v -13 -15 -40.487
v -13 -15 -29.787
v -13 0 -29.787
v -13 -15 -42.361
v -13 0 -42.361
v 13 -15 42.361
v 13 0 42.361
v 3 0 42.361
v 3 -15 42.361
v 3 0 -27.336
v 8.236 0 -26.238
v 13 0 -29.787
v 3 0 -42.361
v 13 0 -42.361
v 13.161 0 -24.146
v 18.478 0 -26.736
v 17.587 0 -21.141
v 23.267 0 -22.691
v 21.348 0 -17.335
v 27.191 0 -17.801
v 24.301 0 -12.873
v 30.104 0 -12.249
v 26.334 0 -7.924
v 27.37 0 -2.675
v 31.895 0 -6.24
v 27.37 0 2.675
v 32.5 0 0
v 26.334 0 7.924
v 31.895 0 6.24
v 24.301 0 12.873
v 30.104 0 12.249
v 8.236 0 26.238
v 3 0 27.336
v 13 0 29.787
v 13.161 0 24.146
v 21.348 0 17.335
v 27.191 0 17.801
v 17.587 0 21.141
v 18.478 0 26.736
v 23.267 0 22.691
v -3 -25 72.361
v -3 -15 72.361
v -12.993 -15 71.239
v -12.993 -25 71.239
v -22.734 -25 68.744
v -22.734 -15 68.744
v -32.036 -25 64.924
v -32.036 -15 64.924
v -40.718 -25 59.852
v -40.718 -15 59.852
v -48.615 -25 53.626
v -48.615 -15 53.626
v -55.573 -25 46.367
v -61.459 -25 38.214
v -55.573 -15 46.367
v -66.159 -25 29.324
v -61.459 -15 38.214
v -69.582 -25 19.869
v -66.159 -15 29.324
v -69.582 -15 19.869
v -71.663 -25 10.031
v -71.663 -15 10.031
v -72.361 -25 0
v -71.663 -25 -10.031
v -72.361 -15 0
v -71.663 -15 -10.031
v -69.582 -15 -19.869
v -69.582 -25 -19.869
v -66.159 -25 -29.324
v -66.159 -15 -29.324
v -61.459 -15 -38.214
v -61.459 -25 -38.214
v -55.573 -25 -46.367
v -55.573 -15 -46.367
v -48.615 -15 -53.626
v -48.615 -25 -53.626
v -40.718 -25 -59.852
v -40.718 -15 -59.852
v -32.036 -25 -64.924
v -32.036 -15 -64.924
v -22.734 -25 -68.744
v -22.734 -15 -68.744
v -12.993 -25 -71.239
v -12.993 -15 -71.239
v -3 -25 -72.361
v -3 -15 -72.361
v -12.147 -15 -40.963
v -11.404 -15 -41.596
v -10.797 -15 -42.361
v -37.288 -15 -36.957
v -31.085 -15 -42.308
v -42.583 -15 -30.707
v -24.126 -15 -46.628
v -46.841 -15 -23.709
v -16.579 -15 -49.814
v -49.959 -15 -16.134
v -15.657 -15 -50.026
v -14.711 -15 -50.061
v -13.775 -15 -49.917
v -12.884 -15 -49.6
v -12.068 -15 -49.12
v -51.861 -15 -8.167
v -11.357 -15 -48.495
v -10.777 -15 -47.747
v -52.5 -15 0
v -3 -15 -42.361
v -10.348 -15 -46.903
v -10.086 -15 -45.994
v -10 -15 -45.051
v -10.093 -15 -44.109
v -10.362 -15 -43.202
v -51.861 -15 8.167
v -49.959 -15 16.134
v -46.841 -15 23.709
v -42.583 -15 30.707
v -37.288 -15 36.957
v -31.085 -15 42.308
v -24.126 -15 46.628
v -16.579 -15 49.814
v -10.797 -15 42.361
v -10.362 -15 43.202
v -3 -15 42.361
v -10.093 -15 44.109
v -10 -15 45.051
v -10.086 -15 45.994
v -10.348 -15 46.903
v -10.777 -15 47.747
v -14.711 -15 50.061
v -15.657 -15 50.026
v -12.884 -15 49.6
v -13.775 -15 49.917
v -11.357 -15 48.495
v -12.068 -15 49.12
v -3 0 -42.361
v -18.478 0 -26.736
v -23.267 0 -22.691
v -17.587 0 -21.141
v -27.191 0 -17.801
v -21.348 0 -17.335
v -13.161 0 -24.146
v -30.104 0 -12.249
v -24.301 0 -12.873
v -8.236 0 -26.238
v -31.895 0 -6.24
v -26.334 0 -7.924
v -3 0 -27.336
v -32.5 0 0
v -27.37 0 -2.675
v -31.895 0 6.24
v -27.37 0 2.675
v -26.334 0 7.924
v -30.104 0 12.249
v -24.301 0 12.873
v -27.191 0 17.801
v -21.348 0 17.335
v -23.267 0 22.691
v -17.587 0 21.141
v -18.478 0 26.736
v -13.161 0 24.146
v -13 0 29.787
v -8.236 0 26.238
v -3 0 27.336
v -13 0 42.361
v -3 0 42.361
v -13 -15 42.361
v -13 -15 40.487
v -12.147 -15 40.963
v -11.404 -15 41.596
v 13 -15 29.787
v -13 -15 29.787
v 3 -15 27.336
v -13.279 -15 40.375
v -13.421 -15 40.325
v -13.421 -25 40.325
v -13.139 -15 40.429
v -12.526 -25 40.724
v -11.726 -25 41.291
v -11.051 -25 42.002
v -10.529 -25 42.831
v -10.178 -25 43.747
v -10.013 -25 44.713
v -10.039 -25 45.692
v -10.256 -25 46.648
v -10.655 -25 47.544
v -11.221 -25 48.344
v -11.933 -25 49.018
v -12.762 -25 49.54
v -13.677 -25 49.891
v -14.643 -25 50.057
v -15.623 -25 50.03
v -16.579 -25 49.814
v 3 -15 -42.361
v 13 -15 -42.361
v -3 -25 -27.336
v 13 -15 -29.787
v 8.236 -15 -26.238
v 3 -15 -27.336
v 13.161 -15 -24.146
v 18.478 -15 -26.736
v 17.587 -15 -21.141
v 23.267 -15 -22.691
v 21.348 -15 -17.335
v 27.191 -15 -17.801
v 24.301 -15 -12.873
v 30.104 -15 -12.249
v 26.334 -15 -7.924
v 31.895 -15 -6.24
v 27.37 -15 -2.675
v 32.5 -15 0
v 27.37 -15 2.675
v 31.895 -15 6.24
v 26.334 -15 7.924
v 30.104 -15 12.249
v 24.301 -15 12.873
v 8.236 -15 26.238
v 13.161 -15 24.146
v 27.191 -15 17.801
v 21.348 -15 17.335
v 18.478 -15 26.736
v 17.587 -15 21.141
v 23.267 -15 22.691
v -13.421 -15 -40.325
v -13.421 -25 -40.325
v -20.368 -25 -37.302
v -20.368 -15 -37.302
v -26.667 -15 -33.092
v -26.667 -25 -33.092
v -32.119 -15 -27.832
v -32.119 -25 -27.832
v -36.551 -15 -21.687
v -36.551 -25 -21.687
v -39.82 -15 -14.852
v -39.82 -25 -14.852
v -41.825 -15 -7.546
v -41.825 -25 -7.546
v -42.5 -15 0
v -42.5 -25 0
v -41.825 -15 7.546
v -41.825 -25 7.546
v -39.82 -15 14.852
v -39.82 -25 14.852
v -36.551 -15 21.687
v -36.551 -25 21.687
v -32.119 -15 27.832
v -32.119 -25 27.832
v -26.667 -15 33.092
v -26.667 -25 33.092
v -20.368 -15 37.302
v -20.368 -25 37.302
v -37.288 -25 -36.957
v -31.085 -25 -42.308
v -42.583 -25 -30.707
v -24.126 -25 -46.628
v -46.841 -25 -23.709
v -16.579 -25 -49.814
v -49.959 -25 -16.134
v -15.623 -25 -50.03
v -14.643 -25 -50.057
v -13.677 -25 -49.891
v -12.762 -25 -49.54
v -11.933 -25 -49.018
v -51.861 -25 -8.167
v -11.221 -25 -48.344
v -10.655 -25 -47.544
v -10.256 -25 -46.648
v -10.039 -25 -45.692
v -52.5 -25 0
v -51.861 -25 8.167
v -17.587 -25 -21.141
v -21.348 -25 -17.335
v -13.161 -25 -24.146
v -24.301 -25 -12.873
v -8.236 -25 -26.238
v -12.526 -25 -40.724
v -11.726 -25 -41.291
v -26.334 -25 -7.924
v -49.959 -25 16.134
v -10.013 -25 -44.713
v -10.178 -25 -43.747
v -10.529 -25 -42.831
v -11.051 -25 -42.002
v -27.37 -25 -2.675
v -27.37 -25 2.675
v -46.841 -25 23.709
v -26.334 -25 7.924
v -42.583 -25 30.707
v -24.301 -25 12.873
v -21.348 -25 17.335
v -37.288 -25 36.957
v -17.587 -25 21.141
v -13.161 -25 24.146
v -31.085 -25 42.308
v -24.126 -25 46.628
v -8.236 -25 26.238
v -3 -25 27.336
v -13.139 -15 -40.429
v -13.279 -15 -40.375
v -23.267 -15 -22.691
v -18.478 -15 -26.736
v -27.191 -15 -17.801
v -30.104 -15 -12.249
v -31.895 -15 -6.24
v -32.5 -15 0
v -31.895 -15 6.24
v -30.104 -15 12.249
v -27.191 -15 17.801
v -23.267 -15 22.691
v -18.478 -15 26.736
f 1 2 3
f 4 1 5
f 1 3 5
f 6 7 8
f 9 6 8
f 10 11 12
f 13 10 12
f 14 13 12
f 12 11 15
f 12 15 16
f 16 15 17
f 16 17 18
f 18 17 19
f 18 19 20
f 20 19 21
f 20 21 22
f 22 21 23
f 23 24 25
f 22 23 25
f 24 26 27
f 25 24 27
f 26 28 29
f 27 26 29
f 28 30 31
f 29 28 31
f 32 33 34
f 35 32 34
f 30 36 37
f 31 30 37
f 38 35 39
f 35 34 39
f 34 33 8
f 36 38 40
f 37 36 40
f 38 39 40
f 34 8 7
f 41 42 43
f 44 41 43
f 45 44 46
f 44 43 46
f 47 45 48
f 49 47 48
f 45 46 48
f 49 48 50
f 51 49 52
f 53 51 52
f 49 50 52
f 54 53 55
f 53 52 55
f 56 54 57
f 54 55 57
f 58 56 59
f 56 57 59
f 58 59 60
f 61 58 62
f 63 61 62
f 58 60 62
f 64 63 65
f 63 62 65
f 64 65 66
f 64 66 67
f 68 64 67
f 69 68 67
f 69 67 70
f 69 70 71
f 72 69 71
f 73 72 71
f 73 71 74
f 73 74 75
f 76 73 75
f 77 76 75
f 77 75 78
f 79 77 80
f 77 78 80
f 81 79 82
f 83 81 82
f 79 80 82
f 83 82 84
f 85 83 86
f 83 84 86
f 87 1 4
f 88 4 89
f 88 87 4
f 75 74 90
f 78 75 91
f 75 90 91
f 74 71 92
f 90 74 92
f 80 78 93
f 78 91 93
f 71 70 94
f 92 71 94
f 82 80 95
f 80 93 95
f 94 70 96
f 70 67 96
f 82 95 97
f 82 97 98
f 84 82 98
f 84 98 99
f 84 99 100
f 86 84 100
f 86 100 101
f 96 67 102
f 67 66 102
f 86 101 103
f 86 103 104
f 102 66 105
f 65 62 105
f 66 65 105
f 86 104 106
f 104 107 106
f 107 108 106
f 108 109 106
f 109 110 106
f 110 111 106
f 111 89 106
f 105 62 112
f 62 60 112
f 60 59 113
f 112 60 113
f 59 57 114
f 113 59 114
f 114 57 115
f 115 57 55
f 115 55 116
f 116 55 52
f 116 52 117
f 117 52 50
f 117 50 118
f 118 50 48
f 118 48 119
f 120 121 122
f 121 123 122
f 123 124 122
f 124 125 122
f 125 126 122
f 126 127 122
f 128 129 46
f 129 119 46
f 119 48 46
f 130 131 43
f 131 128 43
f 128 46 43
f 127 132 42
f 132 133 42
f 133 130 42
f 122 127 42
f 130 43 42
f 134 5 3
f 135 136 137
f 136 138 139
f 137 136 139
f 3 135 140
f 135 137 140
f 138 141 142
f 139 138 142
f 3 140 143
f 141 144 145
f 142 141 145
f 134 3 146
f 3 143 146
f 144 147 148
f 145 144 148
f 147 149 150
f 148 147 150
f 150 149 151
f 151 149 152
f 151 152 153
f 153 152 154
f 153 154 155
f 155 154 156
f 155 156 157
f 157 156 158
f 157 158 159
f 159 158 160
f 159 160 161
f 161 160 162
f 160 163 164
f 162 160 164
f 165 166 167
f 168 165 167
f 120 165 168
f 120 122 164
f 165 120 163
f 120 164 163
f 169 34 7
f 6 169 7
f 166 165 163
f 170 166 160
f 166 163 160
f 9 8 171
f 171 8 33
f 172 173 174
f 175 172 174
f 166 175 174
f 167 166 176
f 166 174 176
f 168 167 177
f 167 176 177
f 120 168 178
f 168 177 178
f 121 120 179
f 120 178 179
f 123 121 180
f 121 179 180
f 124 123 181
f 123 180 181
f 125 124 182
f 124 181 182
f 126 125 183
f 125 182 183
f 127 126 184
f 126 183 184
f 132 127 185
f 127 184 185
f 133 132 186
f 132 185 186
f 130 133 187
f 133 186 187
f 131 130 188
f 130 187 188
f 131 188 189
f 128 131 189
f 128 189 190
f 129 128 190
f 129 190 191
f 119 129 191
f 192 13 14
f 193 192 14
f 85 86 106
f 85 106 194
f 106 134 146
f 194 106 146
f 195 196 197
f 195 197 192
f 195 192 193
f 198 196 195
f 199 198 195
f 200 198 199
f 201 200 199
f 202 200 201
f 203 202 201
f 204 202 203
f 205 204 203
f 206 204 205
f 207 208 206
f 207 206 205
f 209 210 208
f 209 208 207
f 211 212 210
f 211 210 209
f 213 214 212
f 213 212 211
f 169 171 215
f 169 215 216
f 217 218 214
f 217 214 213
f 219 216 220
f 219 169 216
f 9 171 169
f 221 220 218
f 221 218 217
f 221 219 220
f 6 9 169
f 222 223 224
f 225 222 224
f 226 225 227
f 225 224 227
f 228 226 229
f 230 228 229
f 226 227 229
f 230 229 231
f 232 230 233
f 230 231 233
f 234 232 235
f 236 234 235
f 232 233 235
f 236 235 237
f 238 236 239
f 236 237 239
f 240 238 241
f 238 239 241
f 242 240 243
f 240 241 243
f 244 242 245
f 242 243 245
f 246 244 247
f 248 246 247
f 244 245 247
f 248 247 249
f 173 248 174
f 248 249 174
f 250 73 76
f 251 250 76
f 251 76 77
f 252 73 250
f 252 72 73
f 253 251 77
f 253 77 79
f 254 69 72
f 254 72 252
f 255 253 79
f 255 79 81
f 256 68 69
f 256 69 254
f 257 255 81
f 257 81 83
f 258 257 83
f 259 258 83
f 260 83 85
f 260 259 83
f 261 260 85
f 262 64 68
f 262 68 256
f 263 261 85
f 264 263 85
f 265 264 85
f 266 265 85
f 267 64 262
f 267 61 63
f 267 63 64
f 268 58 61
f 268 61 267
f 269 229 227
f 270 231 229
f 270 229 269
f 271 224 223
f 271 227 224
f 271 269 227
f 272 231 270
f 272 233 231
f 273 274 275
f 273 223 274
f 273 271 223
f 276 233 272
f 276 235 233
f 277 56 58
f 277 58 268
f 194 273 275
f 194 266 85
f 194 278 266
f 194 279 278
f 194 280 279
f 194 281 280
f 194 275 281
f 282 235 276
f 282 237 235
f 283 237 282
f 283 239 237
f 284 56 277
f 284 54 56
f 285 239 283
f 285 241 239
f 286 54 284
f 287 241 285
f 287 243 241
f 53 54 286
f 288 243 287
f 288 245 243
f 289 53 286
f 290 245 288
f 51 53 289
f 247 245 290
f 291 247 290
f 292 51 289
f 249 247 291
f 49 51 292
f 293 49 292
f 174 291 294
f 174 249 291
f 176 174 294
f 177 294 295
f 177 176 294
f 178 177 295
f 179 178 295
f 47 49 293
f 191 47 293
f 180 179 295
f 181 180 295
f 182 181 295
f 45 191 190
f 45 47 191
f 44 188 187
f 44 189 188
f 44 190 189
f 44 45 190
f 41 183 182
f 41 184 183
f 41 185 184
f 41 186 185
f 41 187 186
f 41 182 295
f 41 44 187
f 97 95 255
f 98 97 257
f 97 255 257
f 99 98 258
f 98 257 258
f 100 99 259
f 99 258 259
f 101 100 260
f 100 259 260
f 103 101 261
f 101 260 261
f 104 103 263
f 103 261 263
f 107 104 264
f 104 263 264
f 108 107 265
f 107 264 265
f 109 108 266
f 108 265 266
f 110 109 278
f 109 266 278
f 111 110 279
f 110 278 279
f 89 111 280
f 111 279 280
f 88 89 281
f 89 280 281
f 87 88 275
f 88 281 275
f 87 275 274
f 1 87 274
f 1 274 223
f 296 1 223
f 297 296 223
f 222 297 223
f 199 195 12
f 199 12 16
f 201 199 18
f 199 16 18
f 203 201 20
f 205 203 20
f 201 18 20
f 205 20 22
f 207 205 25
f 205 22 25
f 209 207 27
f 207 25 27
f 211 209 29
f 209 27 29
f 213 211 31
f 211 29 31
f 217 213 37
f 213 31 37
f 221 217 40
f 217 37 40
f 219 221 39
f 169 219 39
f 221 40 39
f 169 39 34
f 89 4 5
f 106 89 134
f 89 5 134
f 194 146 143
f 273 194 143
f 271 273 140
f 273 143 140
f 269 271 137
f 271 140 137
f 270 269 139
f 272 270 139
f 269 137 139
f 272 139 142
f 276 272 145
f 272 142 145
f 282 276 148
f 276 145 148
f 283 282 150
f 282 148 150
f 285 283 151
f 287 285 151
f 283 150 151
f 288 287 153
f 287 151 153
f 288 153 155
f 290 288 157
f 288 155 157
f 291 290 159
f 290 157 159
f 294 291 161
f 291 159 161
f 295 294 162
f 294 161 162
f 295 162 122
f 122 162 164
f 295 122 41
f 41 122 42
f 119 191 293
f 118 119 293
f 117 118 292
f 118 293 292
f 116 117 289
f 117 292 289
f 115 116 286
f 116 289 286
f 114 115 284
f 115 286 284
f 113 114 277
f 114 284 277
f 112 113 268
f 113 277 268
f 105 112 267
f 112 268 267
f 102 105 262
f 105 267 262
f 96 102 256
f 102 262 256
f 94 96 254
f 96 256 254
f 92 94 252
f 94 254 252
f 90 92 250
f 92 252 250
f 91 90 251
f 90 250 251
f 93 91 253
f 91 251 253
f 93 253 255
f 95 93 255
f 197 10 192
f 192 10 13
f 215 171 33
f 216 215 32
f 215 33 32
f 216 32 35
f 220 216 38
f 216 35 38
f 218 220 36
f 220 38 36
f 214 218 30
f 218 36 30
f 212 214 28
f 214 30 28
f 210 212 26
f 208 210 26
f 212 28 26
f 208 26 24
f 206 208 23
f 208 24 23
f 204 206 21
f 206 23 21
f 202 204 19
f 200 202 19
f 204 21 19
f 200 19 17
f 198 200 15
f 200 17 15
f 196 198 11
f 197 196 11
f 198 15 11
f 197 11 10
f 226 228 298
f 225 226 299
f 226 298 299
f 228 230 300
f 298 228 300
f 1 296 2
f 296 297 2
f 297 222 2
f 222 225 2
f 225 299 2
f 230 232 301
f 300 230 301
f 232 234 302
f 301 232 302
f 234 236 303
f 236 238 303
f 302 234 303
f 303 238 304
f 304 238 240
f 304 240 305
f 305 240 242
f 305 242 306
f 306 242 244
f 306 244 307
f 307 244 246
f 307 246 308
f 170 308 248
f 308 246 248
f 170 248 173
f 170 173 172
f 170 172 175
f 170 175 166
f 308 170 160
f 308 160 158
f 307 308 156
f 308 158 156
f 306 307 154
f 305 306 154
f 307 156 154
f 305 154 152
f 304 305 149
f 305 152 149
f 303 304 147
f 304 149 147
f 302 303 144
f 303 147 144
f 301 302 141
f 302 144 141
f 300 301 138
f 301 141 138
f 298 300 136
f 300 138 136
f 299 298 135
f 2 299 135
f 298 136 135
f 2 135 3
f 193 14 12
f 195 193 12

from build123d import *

# Parameters (mm, degrees)
F1_DEPTH = 15
F3_DEPTH = 10
F5_DEPTH = 10


with BuildPart() as f1:
    # F0 (on Front) → F1 (new body)
    with BuildSketch(Plane.XZ):
        with BuildLine():
            ThreePointArc((-3, -27.335874), (-27.5, 0), (-3, 27.335874))
            Line((-3, 27.335874), (-3, 32.361242))
            Line((-3, 32.361242), (-3, 42.361242))
            Line((-3, 42.361242), (-13, 42.361242))
            Line((-13, 42.361242), (-13, 29.786742))
            ThreePointArc((-13, 29.786742), (-32.5, 0), (-13, -29.786742))
            Line((-13, -29.786742), (-13, -42.361242))
            Line((-13, -42.361242), (-3, -42.361242))
            Line((-3, -42.361242), (-3, -32.361242))
            Line((-3, -32.361242), (-3, -27.335874))
        make_face()
        with BuildLine():
            Line((3, 42.361242), (3, 32.361242))
            Line((3, 32.361242), (3, 27.335874))
            ThreePointArc((3, 27.335874), (27.5, 0), (3, -27.335874))
            Line((3, -27.335874), (3, -32.361242))
            Line((3, -32.361242), (3, -42.361242))
            Line((3, -42.361242), (13, -42.361242))
            Line((13, -42.361242), (13, -29.786742))
            ThreePointArc((13, -29.786742), (32.5, 0), (13, 29.786742))
            Line((13, 29.786742), (13, 42.361242))
            Line((13, 42.361242), (3, 42.361242))
        make_face()
    extrude(amount=F1_DEPTH)

    # F2 (on face) → F3 (join)
    with BuildSketch(Plane.XZ.offset(15)):
        with BuildLine():
            ThreePointArc((-3, -27.335874), (-27.5, 0), (-3, 27.335874))
            Line((-3, 27.335874), (-3, 42.361242))
            Line((-3, 42.361242), (-3, 72.361242))
            ThreePointArc((-3, 72.361242), (-72.361, 0), (-3, -72.361242))
            Line((-3, -72.361242), (-3, -42.361242))
            Line((-3, -42.361242), (-3, -27.335874))
        make_face()
    extrude(amount=F3_DEPTH)

    # F4 (on face) → F5 (cut)
    with BuildSketch(Plane.XZ.offset(25)):
        with BuildLine():
            ThreePointArc((-13.421053, 40.325245), (-10.255854, 46.648338), (-16.578947, 49.813537))
            ThreePointArc((-16.578947, 49.813537), (-52.5, 0), (-16.578947, -49.813537))
            ThreePointArc((-16.578947, -49.813537), (-10.255854, -46.648338), (-13.421053, -40.325245))
            ThreePointArc((-13.421053, -40.325245), (-42.5, 0), (-13.421053, 40.325245))
        make_face()
    extrude(amount=-F5_DEPTH, mode=Mode.SUBTRACT)


solid = f1.part
